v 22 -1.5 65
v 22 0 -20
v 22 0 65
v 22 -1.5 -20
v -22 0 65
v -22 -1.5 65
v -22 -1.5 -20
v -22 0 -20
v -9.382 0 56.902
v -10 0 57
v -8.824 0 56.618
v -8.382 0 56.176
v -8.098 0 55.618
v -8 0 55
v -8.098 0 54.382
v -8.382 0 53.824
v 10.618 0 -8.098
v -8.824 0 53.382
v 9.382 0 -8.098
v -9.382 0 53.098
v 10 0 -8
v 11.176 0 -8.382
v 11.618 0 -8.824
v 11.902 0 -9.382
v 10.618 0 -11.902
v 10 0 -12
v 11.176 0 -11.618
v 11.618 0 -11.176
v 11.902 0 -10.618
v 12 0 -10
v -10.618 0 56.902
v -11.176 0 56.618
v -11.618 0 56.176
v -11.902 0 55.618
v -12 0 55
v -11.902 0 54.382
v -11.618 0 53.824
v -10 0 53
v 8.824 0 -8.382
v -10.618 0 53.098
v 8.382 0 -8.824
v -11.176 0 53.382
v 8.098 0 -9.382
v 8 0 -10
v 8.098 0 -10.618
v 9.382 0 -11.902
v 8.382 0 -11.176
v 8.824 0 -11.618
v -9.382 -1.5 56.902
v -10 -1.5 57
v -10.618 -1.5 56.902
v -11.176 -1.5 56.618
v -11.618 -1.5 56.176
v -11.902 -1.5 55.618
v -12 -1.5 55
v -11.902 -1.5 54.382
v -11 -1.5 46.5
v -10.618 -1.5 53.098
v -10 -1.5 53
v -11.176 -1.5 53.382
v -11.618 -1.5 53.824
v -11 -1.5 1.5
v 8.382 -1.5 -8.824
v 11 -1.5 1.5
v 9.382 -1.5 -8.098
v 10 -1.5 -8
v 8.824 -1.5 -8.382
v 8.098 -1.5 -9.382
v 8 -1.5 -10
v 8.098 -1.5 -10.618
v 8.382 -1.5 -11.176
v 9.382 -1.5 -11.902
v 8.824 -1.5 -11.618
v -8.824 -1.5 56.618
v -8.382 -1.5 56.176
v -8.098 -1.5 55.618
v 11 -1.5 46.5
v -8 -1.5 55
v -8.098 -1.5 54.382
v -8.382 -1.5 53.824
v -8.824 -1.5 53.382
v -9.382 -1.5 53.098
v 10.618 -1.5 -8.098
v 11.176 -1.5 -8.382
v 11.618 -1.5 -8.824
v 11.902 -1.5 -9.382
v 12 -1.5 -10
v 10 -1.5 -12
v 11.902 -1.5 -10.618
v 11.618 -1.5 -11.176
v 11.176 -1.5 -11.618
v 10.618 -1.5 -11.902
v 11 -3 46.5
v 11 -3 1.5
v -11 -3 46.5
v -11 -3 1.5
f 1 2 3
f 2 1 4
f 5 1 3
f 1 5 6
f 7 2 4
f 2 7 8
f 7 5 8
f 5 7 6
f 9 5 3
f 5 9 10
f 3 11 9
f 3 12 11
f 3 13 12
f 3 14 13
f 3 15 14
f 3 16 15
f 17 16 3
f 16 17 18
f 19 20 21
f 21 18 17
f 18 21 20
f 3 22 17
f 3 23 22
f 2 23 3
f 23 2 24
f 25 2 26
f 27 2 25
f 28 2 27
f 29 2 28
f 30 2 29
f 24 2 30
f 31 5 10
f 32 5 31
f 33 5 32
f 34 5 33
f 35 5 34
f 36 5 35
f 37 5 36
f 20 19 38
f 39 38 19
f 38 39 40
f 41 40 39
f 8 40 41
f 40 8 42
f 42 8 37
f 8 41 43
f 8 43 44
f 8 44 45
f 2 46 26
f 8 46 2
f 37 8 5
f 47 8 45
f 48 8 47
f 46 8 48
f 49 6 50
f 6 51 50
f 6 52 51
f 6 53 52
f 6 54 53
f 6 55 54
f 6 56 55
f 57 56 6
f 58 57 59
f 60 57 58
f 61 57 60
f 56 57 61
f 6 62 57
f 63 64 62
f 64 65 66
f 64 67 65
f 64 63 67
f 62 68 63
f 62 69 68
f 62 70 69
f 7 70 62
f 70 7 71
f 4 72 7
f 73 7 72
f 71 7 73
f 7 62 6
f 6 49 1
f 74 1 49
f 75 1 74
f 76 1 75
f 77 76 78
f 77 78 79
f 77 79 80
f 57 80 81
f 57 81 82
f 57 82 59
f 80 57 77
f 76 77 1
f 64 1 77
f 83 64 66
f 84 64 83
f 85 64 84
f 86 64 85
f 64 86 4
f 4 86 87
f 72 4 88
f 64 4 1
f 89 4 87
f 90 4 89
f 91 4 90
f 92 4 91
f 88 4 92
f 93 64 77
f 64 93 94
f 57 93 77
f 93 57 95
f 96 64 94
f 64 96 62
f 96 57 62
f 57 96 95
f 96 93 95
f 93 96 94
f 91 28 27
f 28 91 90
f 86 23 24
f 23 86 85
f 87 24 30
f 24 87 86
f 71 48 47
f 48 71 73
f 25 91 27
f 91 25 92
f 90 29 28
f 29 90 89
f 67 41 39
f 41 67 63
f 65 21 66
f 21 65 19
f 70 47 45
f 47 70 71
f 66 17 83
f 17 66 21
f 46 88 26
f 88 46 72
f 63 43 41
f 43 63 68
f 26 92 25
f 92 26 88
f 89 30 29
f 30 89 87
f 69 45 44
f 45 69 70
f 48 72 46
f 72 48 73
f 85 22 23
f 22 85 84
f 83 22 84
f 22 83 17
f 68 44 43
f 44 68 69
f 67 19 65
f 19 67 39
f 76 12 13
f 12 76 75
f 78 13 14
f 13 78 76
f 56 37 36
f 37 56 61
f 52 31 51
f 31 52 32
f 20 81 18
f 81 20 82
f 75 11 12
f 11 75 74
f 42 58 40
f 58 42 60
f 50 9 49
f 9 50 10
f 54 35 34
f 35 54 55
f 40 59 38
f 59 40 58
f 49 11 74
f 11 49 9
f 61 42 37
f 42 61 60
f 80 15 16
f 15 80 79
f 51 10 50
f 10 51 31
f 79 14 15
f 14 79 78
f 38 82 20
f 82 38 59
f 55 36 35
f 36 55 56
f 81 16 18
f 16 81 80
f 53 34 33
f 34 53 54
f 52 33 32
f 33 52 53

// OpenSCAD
$fn = 20;

difference() {
    union() {
        th = 1.5;
        // 45 x 22 x 15
        iw = 22;
        id = 45;
        ow = 44;
        oh = th;
        od = id + 2*20;
        translate([-ow/2, -oh, -20]) cube([ow, oh, od]);
        translate([-iw/2, -2*th, th]) cube([iw, 2*th, id]);
    }
    translate([10, 5, -10]) rotate([90]) cylinder(d = 4, h = 10);
    translate([-10, 5, 55]) rotate([90]) cylinder(d = 4, h = 10);
}
